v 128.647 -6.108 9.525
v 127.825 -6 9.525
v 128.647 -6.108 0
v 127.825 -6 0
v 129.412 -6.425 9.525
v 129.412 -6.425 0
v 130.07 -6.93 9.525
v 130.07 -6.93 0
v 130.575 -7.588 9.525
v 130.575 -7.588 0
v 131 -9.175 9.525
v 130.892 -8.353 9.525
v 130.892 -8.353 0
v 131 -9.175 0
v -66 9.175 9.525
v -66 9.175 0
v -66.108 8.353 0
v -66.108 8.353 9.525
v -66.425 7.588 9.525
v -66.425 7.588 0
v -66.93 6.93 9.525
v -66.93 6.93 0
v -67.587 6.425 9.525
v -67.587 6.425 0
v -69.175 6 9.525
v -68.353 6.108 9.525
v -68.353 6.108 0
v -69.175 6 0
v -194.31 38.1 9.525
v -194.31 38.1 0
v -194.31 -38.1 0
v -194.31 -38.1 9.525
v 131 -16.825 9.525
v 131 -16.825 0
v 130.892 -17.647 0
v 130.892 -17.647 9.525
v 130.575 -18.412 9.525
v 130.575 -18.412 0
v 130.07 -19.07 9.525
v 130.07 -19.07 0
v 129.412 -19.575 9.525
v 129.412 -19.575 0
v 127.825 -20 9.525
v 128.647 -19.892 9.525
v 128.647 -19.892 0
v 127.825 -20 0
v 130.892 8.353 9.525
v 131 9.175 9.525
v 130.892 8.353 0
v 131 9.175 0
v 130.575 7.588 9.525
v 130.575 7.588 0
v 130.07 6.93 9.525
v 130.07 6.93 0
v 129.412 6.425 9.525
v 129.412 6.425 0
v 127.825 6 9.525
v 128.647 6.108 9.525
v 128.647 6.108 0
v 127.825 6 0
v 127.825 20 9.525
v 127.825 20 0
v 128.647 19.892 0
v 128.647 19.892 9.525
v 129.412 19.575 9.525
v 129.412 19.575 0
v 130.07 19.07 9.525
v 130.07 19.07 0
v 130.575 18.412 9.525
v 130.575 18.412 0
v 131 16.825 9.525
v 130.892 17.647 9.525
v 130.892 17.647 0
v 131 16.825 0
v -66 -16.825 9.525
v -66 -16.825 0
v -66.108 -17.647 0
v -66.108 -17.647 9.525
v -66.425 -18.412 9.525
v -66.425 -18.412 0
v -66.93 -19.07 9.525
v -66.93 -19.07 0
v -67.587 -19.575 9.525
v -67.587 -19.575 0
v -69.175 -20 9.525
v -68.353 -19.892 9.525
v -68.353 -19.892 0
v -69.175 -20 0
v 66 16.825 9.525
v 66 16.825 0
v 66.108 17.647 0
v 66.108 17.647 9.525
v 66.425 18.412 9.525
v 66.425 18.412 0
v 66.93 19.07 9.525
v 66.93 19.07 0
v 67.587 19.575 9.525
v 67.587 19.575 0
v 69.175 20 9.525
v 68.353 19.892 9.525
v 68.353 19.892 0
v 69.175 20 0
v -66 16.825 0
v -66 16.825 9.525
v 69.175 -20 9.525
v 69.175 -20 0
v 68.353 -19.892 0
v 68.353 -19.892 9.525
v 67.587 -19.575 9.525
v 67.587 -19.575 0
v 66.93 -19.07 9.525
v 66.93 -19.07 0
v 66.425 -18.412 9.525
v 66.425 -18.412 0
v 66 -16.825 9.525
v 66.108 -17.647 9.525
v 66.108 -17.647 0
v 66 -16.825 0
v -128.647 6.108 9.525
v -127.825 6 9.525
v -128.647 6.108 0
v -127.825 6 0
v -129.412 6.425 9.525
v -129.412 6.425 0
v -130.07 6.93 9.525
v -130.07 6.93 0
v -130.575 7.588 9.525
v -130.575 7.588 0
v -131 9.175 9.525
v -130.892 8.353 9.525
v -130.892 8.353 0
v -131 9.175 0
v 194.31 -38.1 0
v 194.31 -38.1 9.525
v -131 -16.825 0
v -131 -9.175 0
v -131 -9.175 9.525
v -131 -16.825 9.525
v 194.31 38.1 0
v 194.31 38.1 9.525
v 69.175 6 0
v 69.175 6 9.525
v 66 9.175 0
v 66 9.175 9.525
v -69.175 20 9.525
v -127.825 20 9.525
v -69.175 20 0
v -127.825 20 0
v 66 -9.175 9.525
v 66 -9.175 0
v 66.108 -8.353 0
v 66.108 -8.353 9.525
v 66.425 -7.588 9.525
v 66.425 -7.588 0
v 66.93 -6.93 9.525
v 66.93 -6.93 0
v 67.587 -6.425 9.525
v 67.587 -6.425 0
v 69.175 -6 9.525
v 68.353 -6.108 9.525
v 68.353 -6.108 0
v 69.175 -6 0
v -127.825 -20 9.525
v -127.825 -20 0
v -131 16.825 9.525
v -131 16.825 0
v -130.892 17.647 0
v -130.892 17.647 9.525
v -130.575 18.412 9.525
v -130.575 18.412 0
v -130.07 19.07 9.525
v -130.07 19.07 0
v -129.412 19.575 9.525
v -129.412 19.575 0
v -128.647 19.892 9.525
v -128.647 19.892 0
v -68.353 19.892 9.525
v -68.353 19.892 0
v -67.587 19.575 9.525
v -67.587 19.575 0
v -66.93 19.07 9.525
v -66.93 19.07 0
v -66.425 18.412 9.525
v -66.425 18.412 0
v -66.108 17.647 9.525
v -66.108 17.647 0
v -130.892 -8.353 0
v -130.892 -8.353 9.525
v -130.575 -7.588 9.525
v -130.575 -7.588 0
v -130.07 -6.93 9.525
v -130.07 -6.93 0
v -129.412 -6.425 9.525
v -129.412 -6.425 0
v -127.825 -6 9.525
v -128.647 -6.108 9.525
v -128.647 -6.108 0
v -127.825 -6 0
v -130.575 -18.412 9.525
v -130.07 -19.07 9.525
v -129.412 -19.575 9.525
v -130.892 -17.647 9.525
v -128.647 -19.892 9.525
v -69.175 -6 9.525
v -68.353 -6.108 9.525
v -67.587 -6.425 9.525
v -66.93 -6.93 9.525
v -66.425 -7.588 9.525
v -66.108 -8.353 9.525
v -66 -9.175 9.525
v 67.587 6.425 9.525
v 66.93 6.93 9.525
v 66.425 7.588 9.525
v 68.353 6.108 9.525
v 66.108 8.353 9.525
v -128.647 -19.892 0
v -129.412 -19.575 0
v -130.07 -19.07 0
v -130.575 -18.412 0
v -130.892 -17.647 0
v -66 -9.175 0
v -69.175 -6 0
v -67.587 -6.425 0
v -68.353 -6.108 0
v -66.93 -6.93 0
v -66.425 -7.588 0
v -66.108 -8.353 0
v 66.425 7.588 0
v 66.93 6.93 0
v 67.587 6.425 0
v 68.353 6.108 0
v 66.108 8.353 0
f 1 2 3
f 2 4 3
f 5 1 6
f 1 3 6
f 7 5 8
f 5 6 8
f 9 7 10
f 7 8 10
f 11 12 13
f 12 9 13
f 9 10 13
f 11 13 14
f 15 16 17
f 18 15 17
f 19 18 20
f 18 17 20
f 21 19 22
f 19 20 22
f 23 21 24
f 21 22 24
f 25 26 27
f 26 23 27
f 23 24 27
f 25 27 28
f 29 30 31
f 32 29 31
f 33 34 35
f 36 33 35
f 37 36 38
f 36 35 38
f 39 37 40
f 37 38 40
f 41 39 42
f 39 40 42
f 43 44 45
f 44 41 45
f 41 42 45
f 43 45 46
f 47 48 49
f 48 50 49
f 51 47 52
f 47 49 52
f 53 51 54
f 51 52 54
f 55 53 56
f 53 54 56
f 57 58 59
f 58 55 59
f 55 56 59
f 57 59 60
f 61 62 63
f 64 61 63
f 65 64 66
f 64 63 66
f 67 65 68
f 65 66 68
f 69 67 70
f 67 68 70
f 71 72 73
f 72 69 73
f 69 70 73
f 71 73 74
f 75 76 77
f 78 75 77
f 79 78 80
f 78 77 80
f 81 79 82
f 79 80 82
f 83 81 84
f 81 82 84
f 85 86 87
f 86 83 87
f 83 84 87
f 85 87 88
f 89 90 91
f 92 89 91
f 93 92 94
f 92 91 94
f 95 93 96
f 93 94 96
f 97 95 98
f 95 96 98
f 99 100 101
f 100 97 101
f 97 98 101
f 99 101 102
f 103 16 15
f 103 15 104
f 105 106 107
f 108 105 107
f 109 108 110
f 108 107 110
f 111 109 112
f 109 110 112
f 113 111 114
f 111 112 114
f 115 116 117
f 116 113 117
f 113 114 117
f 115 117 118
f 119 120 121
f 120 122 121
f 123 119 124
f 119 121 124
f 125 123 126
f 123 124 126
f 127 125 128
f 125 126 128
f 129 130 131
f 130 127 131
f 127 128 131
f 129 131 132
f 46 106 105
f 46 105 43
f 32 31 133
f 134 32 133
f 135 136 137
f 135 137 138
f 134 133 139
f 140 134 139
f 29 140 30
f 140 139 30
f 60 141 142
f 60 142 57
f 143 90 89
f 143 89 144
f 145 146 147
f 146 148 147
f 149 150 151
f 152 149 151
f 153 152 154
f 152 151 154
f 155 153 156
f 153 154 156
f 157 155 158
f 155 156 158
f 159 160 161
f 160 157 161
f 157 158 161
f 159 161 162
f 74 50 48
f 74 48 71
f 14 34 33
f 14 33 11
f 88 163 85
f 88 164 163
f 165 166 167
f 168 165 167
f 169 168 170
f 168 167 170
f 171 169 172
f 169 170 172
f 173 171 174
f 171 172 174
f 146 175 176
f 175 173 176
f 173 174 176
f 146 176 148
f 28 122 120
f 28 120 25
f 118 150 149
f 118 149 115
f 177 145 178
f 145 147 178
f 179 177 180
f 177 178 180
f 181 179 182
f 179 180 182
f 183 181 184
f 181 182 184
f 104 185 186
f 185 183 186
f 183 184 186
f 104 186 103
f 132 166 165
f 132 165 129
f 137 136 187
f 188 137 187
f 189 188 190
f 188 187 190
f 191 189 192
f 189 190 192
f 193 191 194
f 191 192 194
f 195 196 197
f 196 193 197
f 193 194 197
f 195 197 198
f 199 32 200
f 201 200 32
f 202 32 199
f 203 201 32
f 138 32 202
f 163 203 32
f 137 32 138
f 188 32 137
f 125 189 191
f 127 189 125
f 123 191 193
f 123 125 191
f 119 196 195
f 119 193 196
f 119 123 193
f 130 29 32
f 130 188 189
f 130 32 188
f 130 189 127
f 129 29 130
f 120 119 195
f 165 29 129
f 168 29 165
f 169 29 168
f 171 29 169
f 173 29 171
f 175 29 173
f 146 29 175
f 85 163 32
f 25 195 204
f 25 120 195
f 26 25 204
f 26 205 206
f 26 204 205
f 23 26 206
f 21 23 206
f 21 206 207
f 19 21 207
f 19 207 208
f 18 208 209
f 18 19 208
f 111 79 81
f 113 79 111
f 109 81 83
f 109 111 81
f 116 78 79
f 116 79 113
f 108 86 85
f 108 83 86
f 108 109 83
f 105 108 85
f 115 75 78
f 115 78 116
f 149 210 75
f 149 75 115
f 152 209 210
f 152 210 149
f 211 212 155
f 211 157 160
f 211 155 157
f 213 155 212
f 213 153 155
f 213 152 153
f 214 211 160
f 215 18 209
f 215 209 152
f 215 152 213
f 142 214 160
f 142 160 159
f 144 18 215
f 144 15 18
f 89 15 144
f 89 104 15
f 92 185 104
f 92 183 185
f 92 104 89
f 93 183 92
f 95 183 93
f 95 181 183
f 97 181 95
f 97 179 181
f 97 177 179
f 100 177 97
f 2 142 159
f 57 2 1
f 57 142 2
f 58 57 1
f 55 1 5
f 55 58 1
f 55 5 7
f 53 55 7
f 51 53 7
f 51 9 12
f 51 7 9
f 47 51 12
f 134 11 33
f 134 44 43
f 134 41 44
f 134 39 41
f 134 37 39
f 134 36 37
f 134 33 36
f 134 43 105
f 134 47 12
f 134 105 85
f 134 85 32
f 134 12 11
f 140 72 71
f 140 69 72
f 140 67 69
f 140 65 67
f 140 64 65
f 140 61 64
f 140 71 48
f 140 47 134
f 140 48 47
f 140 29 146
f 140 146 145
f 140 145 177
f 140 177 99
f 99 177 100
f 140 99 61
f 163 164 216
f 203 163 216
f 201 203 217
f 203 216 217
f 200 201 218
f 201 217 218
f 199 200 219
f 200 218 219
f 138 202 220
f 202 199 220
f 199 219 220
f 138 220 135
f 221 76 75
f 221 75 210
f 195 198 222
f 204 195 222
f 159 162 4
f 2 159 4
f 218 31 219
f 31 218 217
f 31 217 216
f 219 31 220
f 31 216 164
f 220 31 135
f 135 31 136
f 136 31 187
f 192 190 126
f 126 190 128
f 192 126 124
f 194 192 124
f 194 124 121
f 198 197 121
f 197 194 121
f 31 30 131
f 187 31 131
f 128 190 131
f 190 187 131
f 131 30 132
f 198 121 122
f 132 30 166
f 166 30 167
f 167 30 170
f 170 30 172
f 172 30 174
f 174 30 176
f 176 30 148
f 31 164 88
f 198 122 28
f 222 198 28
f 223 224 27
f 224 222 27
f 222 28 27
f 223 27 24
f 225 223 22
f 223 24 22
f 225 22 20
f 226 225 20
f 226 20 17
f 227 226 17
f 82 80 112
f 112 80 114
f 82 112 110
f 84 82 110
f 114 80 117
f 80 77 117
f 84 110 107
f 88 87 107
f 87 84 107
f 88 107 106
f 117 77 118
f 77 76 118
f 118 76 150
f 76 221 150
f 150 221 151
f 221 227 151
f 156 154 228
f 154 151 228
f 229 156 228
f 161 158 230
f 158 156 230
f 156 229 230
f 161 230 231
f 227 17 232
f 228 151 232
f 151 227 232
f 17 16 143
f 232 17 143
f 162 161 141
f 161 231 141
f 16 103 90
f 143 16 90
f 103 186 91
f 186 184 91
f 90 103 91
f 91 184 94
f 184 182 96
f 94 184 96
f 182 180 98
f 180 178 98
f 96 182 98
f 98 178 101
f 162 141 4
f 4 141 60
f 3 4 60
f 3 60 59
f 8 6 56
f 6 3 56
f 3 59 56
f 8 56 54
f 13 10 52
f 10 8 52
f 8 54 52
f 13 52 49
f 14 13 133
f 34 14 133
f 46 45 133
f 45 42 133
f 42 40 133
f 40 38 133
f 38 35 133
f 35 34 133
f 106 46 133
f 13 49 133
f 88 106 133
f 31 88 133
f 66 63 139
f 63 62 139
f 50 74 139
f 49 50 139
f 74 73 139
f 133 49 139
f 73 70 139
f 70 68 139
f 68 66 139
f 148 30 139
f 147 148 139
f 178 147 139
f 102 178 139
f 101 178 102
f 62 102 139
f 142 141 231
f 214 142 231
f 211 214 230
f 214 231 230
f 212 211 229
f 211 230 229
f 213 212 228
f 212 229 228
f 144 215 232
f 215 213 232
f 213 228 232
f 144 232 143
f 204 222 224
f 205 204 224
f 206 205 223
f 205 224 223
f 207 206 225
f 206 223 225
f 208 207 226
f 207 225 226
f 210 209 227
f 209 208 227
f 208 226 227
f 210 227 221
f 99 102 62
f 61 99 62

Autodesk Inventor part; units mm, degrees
ref_plane "YZ Plane" through (0, 0, 0) normal (1, 0, 0) x (0, 1, 0)
ref_plane "XZ Plane" through (0, 0, 0) normal (0, 1, 0) x (-1, 0, 0)
ref_plane "XY Plane" through (0, 0, 0) normal (0, 0, 1) x (1, 0, 0)
sketch "Sketch1" plane through (0, 0, 0) normal (0, 0, 1) x (1, 0, 0)
  line L0 (-194.31, -38.1) -> (194.31, -38.1)
  line L1 (194.31, -38.1) -> (194.31, 38.1)
  line L2 (194.31, 38.1) -> (-194.31, 38.1)
  line L3 (-194.31, 38.1) -> (-194.31, -38.1)
  line L4 (-194.31, -38.1) -> (194.31, 38.1) construction
  line L5 (194.31, -38.1) -> (-194.31, 38.1) construction
  line L6 (66, 20) -> (131, 6) construction
  line L7 (131, 20) -> (66, 6) construction
  arc A0 (69.175, 20) -> (66, 16.825) centre (69.175, 16.825) ccw
  arc A1 (66, 9.175) -> (69.175, 6) centre (69.175, 9.175) ccw
  arc A2 (127.825, 6) -> (131, 9.175) centre (127.825, 9.175) ccw
  arc A3 (131, 16.825) -> (127.825, 20) centre (127.825, 16.825) ccw
  line L8 (66, 16.825) -> (66, 9.175)
  line L9 (69.175, 6) -> (127.825, 6)
  line L10 (131, 9.175) -> (131, 16.825)
  line L11 (69.175, 20) -> (127.825, 20)
  line L12 (-131, -6) -> (-66, -20) construction
  line L13 (-66, -6) -> (-131, -20) construction
  arc A4 (-127.825, -6) -> (-131, -9.175) centre (-127.825, -9.175) ccw
  arc A5 (-131, -16.825) -> (-127.825, -20) centre (-127.825, -16.825) ccw
  arc A6 (-69.175, -20) -> (-66, -16.825) centre (-69.175, -16.825) ccw
  arc A7 (-66, -9.175) -> (-69.175, -6) centre (-69.175, -9.175) ccw
  line L14 (-131, -9.175) -> (-131, -16.825)
  line L15 (-127.825, -20) -> (-69.175, -20)
  line L16 (-66, -16.825) -> (-66, -9.175)
  line L17 (-127.825, -6) -> (-69.175, -6)
  arc A8 (-66, 16.825) -> (-69.175, 20) centre (-69.175, 16.825) ccw
  line L18 (-127.825, 20) -> (-69.175, 20)
  line L19 (-127.825, 6) -> (-69.175, 6)
  line L20 (-131, 20) -> (-66, 6) construction
  line L21 (-66, 20) -> (-131, 6) construction
  line L22 (-131, 16.825) -> (-131, 9.175)
  arc A9 (-127.825, 20) -> (-131, 16.825) centre (-127.825, 16.825) ccw
  arc A10 (-131, 9.175) -> (-127.825, 6) centre (-127.825, 9.175) ccw
  line L23 (-66, 9.175) -> (-66, 16.825)
  arc A11 (-69.175, 6) -> (-66, 9.175) centre (-69.175, 9.175) ccw
  arc A12 (131, -9.175) -> (127.825, -6) centre (127.825, -9.175) ccw
  line L24 (69.175, -6) -> (127.825, -6)
  line L25 (69.175, -20) -> (127.825, -20)
  line L26 (66, -6) -> (131, -20) construction
  line L27 (131, -6) -> (66, -20) construction
  line L28 (66, -9.175) -> (66, -16.825)
  arc A13 (69.175, -6) -> (66, -9.175) centre (69.175, -9.175) ccw
  arc A14 (66, -16.825) -> (69.175, -20) centre (69.175, -16.825) ccw
  line L29 (131, -16.825) -> (131, -9.175)
  arc A15 (127.825, -20) -> (131, -16.825) centre (127.825, -16.825) ccw
  point P0 (0, 0)
  point P1 (0, 0)
  point P2 (98.5, 13)
  point P3 (-98.5, -13)
  point P4 (-98.5, 13)
  point P5 (98.5, -13)
  dimension "d0" = 388.62
  dimension "d1" = 76.2
extrude "Extrusion4" add sketch "Sketch1" along normal blind 9.525
properties part number "BK-BKT120-Front" material "Aluminum 6061"
